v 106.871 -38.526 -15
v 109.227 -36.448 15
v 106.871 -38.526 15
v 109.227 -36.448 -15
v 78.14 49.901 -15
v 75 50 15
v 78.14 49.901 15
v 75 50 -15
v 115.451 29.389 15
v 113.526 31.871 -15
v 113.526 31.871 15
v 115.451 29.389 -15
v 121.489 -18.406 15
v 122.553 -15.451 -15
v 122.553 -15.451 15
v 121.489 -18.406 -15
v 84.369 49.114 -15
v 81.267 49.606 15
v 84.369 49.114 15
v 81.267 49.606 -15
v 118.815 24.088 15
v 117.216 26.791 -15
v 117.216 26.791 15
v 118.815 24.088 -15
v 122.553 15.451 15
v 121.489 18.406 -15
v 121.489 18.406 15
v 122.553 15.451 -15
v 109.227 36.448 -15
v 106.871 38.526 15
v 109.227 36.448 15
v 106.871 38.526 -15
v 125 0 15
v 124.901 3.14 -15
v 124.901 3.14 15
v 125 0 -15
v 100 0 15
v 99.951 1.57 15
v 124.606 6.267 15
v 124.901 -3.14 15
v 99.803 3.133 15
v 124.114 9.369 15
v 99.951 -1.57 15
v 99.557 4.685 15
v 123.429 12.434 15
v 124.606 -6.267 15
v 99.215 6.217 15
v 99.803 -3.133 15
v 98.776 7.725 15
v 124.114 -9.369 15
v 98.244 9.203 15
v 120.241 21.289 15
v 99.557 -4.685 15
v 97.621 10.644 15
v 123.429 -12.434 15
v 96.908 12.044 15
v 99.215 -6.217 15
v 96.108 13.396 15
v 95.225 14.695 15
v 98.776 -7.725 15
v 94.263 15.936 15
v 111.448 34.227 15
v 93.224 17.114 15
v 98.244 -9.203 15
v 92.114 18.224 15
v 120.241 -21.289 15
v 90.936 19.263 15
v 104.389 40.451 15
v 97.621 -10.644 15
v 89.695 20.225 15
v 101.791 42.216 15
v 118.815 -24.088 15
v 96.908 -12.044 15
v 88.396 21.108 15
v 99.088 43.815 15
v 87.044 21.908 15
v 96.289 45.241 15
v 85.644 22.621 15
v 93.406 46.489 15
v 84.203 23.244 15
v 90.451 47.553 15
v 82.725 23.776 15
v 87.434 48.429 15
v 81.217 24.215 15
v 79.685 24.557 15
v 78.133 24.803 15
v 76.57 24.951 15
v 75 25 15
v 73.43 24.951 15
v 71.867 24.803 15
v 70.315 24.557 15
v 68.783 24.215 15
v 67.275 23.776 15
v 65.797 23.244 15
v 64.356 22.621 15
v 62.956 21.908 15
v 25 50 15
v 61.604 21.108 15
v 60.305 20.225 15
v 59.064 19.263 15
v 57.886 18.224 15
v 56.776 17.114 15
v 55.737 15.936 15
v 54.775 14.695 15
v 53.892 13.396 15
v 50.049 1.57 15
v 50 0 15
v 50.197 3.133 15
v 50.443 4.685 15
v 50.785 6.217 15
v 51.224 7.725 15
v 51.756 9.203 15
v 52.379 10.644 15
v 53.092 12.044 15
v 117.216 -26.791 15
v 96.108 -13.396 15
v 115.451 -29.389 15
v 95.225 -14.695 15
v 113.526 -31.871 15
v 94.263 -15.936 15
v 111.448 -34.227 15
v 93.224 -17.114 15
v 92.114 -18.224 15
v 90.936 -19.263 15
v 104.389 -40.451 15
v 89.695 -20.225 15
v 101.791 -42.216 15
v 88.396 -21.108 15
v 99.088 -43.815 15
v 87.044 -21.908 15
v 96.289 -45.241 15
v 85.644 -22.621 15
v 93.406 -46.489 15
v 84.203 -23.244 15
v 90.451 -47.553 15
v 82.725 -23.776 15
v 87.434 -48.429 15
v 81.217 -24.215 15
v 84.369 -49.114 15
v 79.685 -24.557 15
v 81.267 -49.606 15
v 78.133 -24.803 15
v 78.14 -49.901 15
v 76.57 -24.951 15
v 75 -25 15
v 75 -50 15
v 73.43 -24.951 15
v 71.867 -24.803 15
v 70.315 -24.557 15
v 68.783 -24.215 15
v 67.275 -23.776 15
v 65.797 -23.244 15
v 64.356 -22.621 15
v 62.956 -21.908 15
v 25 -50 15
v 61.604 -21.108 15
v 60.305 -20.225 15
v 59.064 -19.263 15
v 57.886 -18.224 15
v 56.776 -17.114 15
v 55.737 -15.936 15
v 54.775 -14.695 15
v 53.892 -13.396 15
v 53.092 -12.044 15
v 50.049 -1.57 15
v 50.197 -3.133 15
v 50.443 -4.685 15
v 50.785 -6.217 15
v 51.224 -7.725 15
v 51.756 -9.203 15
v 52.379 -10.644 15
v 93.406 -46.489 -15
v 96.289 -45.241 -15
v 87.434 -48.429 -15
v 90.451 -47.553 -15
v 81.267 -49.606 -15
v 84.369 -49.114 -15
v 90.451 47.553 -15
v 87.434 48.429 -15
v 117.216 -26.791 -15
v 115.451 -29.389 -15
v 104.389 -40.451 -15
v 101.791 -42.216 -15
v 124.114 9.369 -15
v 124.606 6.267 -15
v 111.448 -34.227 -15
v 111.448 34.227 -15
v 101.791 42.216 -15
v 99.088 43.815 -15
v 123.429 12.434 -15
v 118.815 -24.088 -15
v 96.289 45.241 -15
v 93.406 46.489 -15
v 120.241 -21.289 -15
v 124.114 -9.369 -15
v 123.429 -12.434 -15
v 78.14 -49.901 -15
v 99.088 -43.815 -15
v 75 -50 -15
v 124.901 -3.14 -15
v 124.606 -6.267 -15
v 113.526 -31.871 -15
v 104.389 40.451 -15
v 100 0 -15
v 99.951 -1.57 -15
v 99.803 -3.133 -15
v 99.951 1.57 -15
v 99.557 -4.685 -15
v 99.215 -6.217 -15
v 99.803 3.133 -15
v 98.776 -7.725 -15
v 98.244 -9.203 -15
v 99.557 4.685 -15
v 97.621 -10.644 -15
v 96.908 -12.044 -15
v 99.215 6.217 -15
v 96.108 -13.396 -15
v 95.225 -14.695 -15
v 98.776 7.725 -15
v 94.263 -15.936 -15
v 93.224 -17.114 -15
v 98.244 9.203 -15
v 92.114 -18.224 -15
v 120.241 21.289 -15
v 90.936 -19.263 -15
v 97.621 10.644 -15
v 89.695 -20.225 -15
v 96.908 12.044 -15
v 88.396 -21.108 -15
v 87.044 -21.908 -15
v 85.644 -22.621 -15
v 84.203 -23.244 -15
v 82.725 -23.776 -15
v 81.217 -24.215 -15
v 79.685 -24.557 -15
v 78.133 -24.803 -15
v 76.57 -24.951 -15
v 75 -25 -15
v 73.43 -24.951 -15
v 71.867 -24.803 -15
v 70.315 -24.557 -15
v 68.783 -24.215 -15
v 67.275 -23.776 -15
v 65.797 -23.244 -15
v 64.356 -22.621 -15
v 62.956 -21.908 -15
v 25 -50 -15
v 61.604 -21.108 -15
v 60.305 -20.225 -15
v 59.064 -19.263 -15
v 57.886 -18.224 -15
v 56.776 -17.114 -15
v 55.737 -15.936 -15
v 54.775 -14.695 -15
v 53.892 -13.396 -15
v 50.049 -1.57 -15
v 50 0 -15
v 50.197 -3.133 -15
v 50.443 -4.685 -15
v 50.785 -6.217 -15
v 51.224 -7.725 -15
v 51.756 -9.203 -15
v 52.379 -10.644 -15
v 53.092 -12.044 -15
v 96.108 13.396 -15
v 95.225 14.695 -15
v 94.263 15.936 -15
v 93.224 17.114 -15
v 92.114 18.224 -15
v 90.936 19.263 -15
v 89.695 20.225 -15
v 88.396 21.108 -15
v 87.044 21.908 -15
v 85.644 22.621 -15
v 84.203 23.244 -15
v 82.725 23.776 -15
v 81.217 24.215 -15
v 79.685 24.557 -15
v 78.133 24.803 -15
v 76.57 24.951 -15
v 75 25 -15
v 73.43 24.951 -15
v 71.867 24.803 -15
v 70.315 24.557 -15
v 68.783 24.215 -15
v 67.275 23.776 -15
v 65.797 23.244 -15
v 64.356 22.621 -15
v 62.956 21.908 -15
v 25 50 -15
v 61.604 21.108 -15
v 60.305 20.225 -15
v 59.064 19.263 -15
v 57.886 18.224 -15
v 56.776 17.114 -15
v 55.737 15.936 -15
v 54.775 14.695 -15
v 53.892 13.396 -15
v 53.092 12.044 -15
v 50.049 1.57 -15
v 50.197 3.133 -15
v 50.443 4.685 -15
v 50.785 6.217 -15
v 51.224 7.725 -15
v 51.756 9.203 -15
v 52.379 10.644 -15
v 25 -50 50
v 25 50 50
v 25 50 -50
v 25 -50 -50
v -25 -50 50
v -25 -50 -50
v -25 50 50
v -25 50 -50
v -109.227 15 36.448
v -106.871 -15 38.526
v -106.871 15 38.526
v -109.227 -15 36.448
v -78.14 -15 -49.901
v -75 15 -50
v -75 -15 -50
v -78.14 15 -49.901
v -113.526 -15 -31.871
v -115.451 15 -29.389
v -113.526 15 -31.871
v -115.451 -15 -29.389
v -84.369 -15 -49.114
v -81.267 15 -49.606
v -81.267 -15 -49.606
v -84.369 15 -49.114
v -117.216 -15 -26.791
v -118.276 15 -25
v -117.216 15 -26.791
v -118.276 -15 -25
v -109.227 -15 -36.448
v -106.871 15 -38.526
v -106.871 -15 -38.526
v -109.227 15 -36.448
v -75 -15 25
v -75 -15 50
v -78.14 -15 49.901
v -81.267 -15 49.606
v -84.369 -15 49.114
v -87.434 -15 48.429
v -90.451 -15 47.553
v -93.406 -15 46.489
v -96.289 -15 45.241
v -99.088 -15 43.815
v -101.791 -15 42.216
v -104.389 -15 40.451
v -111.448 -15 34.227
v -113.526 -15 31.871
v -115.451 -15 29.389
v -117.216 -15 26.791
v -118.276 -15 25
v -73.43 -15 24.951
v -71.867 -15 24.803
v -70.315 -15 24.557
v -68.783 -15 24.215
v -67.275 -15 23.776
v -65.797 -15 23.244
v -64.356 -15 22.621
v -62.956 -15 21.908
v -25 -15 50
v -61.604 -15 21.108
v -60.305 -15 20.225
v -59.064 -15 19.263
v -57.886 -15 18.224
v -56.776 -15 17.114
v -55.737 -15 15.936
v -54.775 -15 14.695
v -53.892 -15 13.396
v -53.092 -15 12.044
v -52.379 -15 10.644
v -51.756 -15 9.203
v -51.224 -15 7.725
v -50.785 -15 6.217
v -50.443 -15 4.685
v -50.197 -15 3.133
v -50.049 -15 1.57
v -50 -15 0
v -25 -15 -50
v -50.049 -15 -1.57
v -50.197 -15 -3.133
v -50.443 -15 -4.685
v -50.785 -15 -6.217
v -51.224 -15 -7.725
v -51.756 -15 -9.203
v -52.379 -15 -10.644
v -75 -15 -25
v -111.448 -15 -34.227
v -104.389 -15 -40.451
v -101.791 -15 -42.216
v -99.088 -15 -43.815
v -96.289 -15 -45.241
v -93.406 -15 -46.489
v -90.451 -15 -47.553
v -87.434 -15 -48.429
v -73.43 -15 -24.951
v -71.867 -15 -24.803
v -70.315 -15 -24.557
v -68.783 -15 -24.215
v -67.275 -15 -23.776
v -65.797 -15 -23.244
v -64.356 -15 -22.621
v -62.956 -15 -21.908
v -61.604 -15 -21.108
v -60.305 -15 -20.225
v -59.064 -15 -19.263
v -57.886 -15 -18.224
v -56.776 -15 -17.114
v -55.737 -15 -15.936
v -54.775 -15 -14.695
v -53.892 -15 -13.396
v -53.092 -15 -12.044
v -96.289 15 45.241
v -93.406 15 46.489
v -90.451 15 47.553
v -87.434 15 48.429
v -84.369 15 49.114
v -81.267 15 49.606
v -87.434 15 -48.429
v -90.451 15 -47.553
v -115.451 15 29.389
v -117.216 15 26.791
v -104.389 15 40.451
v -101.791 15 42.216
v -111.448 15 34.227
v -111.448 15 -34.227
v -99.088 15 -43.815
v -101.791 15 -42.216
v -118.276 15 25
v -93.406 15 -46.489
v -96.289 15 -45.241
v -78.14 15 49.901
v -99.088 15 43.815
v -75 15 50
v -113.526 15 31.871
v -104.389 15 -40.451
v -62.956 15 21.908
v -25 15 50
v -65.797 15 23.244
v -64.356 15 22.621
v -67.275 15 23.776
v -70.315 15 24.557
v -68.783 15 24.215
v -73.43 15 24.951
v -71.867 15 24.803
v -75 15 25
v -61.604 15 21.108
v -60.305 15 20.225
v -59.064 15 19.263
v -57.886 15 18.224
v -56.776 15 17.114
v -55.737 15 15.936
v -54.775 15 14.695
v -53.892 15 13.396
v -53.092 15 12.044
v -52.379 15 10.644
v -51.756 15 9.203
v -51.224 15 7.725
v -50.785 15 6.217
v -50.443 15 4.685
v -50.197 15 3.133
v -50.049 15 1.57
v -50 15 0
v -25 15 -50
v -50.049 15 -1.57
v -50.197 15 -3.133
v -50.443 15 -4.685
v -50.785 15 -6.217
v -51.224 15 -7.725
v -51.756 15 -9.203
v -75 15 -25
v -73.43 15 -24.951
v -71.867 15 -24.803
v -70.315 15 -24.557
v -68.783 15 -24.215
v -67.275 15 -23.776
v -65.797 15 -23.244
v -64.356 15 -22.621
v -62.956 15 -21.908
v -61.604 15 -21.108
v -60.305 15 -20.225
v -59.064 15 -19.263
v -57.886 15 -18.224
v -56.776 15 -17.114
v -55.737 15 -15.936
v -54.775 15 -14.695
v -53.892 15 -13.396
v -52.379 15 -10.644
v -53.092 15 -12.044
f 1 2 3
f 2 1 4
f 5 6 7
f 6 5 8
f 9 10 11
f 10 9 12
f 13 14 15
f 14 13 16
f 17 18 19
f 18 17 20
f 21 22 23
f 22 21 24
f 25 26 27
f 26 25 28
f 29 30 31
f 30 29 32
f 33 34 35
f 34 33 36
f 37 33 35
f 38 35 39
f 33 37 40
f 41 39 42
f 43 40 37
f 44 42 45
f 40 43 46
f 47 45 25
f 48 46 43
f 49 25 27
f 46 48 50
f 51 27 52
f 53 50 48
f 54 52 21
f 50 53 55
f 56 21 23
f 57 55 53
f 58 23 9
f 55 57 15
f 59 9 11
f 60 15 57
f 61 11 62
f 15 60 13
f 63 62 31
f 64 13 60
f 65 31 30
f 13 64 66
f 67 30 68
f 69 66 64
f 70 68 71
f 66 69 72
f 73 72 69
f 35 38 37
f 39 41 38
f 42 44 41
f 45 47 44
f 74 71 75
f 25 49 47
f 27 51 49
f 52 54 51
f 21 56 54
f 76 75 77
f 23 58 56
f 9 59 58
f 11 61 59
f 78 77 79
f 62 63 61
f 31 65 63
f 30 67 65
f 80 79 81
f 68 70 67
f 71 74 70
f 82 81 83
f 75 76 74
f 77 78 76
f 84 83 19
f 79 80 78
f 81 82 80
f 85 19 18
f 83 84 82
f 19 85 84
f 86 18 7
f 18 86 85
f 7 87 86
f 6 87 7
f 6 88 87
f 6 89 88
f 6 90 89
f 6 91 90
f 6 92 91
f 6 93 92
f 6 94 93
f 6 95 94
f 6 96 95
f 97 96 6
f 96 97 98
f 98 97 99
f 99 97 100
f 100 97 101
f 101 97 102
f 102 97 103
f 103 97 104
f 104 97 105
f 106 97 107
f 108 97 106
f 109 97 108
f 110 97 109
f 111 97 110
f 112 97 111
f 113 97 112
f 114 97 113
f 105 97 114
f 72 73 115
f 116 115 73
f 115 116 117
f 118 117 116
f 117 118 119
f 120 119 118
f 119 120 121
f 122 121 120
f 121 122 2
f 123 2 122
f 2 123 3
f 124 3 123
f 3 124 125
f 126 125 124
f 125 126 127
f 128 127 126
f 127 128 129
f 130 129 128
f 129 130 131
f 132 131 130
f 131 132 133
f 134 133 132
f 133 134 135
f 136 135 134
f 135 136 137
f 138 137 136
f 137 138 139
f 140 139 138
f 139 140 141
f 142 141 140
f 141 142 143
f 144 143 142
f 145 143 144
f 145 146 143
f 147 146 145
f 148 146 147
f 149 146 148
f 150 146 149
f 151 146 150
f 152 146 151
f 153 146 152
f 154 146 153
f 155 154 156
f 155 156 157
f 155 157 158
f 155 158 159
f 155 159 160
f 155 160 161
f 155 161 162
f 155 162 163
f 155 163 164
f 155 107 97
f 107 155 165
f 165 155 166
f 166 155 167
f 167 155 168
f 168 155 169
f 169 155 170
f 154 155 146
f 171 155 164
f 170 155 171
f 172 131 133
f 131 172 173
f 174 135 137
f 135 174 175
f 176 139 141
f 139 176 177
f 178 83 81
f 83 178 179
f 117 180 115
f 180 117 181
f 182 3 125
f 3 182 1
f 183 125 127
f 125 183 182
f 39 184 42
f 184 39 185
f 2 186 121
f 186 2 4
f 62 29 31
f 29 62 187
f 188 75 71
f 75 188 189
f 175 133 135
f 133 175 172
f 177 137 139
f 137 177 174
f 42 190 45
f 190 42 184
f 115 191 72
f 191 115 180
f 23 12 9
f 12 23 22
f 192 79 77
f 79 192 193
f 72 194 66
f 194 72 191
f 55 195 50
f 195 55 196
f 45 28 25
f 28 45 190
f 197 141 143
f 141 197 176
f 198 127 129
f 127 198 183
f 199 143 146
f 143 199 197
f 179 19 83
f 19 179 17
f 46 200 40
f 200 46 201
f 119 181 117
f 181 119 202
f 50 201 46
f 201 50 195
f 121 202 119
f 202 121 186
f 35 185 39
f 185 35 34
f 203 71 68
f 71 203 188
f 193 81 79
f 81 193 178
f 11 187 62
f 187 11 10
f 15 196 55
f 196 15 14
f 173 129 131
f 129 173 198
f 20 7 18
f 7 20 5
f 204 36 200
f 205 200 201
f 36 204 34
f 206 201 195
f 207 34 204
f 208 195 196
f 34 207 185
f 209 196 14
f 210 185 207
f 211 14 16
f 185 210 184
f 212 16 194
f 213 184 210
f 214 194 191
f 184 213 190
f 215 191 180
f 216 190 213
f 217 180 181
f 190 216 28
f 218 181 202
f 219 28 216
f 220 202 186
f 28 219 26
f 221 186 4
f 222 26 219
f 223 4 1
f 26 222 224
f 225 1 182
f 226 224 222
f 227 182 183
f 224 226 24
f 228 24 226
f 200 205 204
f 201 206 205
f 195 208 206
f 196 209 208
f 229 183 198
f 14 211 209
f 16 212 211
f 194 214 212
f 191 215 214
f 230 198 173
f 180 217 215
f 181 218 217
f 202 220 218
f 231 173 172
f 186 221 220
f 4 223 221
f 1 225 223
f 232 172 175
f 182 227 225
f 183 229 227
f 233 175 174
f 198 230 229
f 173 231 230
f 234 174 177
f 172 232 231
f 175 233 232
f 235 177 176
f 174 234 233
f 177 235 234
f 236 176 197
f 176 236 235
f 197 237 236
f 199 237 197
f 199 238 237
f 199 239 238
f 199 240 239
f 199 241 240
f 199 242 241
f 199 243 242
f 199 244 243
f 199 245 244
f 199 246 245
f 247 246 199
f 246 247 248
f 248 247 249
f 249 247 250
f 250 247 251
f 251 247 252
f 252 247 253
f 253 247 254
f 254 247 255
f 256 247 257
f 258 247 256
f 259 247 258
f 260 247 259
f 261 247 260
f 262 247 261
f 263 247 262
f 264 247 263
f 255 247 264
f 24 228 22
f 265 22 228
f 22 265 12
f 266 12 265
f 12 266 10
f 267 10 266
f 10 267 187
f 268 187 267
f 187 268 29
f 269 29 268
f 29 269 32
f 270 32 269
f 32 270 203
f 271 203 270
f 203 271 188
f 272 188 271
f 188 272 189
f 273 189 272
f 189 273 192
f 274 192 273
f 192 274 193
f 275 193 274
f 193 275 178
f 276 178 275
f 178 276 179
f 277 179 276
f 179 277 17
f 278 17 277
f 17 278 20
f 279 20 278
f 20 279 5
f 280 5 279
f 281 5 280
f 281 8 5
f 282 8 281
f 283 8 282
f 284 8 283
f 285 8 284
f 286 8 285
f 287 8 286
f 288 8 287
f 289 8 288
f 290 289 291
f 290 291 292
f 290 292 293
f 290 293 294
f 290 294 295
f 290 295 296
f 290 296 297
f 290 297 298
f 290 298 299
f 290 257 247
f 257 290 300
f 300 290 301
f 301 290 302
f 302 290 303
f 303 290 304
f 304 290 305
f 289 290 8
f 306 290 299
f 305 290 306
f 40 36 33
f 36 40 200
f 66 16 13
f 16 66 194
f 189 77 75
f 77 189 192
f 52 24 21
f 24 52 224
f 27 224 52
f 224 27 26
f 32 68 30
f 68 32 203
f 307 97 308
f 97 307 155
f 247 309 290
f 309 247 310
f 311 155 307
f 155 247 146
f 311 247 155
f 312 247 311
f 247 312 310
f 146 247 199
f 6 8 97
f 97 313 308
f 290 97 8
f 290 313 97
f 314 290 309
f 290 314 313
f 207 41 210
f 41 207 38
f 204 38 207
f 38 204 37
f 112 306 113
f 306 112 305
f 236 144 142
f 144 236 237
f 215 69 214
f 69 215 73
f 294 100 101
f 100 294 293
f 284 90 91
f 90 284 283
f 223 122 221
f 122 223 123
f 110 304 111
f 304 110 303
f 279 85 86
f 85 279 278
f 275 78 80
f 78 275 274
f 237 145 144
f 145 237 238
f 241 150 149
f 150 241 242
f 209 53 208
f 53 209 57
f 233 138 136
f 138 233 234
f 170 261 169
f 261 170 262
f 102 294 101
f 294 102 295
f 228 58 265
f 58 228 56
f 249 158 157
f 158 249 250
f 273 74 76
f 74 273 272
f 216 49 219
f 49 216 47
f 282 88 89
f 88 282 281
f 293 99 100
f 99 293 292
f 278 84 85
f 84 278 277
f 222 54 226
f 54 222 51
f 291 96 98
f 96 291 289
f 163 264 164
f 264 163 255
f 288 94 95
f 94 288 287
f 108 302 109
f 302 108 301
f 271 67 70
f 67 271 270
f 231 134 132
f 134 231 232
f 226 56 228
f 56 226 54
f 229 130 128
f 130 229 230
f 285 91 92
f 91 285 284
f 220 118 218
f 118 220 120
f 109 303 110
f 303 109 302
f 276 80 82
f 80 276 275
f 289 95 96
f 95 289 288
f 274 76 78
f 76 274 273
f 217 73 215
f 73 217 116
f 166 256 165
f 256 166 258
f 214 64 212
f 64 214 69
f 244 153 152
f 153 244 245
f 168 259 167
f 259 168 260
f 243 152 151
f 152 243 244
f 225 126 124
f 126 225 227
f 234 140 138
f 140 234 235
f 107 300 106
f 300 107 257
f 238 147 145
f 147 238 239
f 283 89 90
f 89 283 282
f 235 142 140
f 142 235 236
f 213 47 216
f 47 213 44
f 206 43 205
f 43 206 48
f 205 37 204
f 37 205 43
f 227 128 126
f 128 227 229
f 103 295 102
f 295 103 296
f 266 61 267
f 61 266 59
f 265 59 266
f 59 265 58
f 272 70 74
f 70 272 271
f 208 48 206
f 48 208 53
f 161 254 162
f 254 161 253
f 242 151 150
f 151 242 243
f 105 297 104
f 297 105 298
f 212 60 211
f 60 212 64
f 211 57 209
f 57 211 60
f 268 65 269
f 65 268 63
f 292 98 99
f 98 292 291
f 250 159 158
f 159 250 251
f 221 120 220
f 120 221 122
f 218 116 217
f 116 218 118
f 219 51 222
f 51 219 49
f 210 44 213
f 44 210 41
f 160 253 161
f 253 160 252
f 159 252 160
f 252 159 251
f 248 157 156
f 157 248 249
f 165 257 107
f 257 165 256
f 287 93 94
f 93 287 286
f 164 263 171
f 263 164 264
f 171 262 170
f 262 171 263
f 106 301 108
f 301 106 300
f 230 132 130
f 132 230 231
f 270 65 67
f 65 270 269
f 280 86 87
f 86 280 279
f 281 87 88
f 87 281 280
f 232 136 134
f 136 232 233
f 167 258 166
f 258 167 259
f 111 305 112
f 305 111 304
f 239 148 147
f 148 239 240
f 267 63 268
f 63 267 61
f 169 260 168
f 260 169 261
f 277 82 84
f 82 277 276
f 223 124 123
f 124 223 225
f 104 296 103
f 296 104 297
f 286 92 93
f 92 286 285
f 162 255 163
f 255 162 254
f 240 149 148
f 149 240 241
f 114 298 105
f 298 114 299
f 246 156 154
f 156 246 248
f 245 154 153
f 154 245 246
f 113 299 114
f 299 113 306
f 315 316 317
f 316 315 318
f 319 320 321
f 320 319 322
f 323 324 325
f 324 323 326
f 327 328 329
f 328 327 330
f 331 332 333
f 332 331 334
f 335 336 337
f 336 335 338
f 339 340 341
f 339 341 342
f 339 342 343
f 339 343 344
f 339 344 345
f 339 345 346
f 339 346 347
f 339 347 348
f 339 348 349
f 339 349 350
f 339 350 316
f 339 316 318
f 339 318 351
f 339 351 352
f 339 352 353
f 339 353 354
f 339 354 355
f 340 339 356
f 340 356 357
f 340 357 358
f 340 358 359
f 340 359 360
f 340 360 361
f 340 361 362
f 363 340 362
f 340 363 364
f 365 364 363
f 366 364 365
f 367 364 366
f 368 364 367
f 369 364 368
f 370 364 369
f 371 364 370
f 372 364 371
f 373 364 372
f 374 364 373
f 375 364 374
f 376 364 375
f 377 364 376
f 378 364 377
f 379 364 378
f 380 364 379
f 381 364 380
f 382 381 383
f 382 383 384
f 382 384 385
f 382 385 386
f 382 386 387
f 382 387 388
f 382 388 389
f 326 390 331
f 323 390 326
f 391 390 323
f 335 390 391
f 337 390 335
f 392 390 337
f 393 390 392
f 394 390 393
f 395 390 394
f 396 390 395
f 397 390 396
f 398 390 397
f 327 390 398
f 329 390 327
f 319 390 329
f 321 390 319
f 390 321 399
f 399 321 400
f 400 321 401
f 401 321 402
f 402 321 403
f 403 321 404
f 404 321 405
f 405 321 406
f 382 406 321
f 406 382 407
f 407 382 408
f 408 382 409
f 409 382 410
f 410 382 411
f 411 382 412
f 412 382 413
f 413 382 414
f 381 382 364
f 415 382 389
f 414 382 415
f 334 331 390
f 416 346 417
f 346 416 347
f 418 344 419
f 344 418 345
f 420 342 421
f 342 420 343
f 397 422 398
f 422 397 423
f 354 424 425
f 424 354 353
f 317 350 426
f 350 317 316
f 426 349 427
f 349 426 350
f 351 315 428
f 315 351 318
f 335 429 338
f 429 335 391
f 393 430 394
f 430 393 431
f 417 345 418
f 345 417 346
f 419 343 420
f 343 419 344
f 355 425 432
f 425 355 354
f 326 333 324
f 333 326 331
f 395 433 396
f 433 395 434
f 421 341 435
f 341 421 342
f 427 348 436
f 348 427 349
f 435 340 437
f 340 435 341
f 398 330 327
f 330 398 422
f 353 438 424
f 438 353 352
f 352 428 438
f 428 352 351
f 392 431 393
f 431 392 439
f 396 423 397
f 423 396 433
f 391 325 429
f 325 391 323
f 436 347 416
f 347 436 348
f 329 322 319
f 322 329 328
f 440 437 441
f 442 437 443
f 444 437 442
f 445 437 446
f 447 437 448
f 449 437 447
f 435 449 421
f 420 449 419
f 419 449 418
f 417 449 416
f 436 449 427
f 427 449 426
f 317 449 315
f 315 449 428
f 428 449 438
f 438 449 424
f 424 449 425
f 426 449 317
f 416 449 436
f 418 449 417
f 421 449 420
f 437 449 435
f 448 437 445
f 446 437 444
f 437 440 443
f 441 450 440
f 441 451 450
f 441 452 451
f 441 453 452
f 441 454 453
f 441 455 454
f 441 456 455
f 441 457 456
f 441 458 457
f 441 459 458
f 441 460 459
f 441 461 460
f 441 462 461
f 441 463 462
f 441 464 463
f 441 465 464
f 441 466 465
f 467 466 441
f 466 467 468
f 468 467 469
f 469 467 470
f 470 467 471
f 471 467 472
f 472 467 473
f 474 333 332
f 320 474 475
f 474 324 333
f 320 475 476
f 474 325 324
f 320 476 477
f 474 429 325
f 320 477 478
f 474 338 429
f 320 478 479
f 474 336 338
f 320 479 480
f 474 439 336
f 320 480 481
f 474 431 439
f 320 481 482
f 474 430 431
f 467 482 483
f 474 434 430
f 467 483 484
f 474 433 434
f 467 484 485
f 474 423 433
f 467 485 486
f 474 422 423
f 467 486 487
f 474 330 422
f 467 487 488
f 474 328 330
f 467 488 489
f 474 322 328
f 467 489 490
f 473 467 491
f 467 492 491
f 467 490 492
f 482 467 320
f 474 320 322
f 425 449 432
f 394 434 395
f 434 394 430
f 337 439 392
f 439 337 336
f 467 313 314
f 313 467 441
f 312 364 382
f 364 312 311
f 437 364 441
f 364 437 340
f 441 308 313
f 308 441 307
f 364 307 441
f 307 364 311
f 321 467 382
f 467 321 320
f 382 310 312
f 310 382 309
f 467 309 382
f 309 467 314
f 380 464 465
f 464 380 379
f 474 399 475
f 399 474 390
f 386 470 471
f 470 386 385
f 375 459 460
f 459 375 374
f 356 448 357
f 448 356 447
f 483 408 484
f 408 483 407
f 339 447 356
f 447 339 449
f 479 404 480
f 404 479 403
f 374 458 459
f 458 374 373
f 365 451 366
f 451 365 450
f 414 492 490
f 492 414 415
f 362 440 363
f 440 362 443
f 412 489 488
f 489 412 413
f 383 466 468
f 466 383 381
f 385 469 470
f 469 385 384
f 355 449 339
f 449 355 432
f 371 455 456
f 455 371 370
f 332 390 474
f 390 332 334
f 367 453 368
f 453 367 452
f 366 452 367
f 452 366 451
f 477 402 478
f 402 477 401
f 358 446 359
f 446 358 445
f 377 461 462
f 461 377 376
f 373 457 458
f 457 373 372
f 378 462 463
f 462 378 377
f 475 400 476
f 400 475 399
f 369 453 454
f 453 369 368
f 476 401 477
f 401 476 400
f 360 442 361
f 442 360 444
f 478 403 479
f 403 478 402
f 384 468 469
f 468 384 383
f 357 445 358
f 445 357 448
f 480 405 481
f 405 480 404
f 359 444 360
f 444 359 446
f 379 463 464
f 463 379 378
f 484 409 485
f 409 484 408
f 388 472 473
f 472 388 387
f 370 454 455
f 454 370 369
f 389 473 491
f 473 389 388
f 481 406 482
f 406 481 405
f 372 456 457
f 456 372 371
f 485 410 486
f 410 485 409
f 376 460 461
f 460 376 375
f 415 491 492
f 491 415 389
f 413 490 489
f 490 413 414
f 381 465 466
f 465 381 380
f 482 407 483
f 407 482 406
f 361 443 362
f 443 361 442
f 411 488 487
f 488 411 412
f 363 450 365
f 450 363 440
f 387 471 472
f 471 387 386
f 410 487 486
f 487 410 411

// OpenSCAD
// file: lib.scad
module pair(split,rot=0){
     rotate([0,0,rot]){
	  translate([split/2,0,0]){
	       children();}
	  translate([-split/2,0,0]){
	       rotate([0,0,180]){
		    children();}}}}

module set(count,r){
     for(i=[0:count]){
	  rotate([0,0,360/count*i]){
	       translate([r,0,0]){
		    children();}}}}

module up(distance){
     translate([0,0,distance]){
	  children();}}

module arch(radius,height,thickness){
     cylinder(r=radius,h=thickness);
     translate([0,-radius,0]){
	  cube([height-radius,2*radius,thickness]);}}
// main file
$fn=100;
mm=1; // define units
degrees=1;

use <lib.scad>;

module example_104(){
     body_thickness=50*mm;
     side_length=100*mm;
     module part_1(){
	  translate([body_thickness/2,0,0]){
	       children();}}
     module part_2(){
	  rotate([90,180,0]){
	       translate([body_thickness/2,0,0]){
		    children();}}}
     module body(){
	  cube([body_thickness,side_length,side_length],center=true);}
     module plate(){
	  thickness=30*mm;
	  translate([side_length/2,0,-thickness/2]){
	       rotate([0,0,180]){
		    arch(side_length/2,side_length,thickness);}}}
     module washer(){
	  pin_hole=25*mm;
	  difference(){
	       plate();
	       translate([side_length/2,0,0]){
		    cylinder(r=pin_hole,h=body_thickness,center=true);}}}
     module claw(){
  	  pin_hole=25*mm;
	  difference(){
	       plate();
	       translate([side_length/2,0,0]){
		    hull(){
			 cylinder(r=pin_hole,h=body_thickness,center=true);
			 translate([body_thickness,0,0]){
			      cylinder(r=pin_hole,h=body_thickness,center=true);}}}}}
     union(){
	  body();
	  part_1() washer();
	  part_2() claw();}}

example_104();
